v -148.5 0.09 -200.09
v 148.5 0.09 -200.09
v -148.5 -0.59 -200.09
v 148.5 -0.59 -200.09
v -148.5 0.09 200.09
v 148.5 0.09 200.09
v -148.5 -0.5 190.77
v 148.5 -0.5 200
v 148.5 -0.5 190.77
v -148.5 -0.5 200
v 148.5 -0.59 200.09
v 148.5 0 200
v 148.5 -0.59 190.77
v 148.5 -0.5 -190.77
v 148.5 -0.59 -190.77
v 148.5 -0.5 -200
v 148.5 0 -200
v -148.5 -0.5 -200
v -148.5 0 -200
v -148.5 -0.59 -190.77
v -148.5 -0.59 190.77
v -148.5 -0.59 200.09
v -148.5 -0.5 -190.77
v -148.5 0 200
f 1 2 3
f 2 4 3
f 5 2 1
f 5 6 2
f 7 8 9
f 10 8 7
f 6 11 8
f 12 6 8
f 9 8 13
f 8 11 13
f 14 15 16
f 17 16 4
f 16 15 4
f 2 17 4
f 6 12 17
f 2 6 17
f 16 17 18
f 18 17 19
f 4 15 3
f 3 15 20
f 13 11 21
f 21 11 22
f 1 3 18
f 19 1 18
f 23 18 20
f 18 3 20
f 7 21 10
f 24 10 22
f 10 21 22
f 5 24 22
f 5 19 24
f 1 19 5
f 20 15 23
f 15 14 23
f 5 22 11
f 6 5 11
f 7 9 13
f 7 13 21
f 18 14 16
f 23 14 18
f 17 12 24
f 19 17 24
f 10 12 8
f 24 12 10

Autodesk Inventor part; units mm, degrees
ref_plane "YZ Plane" through (0, 0, 0) normal (1, 0, 0) x (0, 1, 0)
ref_plane "XZ Plane" through (0, 0, 0) normal (0, 1, 0) x (-1, 0, 0)
ref_plane "XY Plane" through (0, 0, 0) normal (0, 0, 1) x (1, 0, 0)
sketch "スケッチ1" plane through (0, 0, 0) normal (0, 1, 0) x (-1, 0, 0)
  line L0 (148.5, 200.09) -> (-148.5, 200.09)
  line L1 (-148.5, 200.09) -> (-148.5, -200.09)
  line L2 (-148.5, -200.09) -> (148.5, -200.09)
  line L3 (148.5, -200.09) -> (148.5, 200.09)
  line L4 (148.5, 200.09) -> (-148.5, -200.09) construction
  line L5 (-148.5, 200.09) -> (148.5, -200.09) construction
  line L6 (-148.5, 190.77) -> (148.5, 190.77)
  line L7 (-207.9, 0) -> (207.9, 0) construction
  line L8 (-148.5, -190.77) -> (148.5, -190.77)
  line L9 (-148.5, 200) -> (148.5, 200)
  line L10 (-148.5, -200) -> (148.5, -200)
  point P0 (0, 0)
  point P1 (-148.5, -200)
  point P2 (-148.5, -190.77)
  dimension "d1" = 297
  dimension "d4" = 9.32
  dimension "d5" = 0.09
  dimension "d10" = 400
extrude "押し出し1" add sketch "スケッチ1" along normal blind 0.09
extrude "押し出し2" add sketch "スケッチ1" against normal blind 0.5 contours L3 L9 L1 L0 | L3 L2 L1 L10
extrude "押し出し3" add sketch "スケッチ1" against normal blind 0.09 from surface at -0.5 contours L3 L9 L1 L0 | L3 L6 L1 L9 | L3 L10 L1 L8 | L3 L2 L1 L10
properties part number "field_plate_SUS4301"
